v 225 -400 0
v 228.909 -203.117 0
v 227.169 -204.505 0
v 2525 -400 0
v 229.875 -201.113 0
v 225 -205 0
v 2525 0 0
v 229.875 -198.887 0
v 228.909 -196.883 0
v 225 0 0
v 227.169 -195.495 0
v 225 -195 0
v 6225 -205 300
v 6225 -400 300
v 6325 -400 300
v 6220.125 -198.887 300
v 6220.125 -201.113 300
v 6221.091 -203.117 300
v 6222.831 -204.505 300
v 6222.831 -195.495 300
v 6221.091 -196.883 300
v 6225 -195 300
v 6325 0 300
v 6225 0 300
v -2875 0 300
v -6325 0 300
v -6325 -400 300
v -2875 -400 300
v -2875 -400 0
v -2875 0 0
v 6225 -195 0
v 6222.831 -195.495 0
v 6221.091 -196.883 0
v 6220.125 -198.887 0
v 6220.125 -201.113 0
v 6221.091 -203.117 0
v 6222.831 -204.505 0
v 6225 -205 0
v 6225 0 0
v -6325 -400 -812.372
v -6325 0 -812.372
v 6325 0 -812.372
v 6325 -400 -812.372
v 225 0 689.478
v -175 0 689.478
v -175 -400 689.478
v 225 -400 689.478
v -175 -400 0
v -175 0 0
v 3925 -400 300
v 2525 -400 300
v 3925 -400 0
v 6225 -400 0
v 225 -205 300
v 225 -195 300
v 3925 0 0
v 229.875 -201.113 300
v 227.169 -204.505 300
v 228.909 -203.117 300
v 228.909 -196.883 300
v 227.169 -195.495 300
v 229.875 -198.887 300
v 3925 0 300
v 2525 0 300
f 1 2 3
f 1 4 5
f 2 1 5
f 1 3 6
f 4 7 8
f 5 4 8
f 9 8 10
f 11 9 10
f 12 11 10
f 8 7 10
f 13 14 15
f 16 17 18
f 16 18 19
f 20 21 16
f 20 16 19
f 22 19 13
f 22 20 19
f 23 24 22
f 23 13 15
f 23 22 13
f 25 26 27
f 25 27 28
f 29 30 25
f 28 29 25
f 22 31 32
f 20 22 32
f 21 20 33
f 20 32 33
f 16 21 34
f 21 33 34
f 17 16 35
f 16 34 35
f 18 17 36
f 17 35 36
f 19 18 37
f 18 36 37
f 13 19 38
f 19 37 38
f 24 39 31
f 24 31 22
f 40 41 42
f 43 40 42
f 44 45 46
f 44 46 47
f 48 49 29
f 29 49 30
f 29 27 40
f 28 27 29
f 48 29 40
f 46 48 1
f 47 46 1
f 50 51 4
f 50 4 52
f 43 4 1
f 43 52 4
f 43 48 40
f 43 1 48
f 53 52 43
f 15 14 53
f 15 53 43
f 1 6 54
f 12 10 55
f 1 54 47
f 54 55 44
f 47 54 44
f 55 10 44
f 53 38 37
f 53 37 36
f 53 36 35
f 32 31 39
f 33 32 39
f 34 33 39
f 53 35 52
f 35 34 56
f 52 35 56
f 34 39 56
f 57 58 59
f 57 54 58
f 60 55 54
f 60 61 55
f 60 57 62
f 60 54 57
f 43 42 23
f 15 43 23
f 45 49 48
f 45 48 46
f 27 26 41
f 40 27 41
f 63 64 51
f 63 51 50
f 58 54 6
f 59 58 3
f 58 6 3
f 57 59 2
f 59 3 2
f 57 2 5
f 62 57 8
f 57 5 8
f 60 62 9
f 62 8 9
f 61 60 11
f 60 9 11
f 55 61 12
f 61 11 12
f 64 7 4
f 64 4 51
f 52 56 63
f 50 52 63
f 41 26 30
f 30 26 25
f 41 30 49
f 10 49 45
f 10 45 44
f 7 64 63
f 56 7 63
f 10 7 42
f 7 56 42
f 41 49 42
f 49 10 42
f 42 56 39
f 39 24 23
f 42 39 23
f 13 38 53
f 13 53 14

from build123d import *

# Parameters (mm, degrees)
F0_W     = 3450
F0_H     = 300
F0_W_2   = 400
F0_H_2   = 689.478278
F0_W_3   = 100
F0_W_4   = 1400
F1_DEPTH = 400
F2_R     = 5
F3_DEPTH = 300


with BuildPart() as f1:
    # F0 (on Front) → F1 (new body)
    with BuildSketch(Plane.XZ):
        with Locations((-4600, 150)):
            Rectangle(F0_W, F0_H)
        Polygon((-2875, 0), (-6325, 0), (-6325, -812.372148), (6325, -812.372148), (6325, 0), (6225, 0), (3925, 0), (2525, 0), (225, 0), (-175, 0), align=None)
        with Locations((25, 344.739139)):
            Rectangle(F0_W_2, F0_H_2)
        with Locations((6275, 150)):
            Rectangle(F0_W_3, F0_H)
        with Locations((3225, 150)):
            Rectangle(F0_W_4, F0_H)
    extrude(amount=F1_DEPTH)

    # F2 (on face) → F3 (join, through all)
    with BuildSketch(Plane.XY):
        with Locations((225, -200)):
            Circle(F2_R)
        with Locations((6225, -200)):
            Circle(F2_R)
    extrude(amount=F3_DEPTH)


solid = f1.part
